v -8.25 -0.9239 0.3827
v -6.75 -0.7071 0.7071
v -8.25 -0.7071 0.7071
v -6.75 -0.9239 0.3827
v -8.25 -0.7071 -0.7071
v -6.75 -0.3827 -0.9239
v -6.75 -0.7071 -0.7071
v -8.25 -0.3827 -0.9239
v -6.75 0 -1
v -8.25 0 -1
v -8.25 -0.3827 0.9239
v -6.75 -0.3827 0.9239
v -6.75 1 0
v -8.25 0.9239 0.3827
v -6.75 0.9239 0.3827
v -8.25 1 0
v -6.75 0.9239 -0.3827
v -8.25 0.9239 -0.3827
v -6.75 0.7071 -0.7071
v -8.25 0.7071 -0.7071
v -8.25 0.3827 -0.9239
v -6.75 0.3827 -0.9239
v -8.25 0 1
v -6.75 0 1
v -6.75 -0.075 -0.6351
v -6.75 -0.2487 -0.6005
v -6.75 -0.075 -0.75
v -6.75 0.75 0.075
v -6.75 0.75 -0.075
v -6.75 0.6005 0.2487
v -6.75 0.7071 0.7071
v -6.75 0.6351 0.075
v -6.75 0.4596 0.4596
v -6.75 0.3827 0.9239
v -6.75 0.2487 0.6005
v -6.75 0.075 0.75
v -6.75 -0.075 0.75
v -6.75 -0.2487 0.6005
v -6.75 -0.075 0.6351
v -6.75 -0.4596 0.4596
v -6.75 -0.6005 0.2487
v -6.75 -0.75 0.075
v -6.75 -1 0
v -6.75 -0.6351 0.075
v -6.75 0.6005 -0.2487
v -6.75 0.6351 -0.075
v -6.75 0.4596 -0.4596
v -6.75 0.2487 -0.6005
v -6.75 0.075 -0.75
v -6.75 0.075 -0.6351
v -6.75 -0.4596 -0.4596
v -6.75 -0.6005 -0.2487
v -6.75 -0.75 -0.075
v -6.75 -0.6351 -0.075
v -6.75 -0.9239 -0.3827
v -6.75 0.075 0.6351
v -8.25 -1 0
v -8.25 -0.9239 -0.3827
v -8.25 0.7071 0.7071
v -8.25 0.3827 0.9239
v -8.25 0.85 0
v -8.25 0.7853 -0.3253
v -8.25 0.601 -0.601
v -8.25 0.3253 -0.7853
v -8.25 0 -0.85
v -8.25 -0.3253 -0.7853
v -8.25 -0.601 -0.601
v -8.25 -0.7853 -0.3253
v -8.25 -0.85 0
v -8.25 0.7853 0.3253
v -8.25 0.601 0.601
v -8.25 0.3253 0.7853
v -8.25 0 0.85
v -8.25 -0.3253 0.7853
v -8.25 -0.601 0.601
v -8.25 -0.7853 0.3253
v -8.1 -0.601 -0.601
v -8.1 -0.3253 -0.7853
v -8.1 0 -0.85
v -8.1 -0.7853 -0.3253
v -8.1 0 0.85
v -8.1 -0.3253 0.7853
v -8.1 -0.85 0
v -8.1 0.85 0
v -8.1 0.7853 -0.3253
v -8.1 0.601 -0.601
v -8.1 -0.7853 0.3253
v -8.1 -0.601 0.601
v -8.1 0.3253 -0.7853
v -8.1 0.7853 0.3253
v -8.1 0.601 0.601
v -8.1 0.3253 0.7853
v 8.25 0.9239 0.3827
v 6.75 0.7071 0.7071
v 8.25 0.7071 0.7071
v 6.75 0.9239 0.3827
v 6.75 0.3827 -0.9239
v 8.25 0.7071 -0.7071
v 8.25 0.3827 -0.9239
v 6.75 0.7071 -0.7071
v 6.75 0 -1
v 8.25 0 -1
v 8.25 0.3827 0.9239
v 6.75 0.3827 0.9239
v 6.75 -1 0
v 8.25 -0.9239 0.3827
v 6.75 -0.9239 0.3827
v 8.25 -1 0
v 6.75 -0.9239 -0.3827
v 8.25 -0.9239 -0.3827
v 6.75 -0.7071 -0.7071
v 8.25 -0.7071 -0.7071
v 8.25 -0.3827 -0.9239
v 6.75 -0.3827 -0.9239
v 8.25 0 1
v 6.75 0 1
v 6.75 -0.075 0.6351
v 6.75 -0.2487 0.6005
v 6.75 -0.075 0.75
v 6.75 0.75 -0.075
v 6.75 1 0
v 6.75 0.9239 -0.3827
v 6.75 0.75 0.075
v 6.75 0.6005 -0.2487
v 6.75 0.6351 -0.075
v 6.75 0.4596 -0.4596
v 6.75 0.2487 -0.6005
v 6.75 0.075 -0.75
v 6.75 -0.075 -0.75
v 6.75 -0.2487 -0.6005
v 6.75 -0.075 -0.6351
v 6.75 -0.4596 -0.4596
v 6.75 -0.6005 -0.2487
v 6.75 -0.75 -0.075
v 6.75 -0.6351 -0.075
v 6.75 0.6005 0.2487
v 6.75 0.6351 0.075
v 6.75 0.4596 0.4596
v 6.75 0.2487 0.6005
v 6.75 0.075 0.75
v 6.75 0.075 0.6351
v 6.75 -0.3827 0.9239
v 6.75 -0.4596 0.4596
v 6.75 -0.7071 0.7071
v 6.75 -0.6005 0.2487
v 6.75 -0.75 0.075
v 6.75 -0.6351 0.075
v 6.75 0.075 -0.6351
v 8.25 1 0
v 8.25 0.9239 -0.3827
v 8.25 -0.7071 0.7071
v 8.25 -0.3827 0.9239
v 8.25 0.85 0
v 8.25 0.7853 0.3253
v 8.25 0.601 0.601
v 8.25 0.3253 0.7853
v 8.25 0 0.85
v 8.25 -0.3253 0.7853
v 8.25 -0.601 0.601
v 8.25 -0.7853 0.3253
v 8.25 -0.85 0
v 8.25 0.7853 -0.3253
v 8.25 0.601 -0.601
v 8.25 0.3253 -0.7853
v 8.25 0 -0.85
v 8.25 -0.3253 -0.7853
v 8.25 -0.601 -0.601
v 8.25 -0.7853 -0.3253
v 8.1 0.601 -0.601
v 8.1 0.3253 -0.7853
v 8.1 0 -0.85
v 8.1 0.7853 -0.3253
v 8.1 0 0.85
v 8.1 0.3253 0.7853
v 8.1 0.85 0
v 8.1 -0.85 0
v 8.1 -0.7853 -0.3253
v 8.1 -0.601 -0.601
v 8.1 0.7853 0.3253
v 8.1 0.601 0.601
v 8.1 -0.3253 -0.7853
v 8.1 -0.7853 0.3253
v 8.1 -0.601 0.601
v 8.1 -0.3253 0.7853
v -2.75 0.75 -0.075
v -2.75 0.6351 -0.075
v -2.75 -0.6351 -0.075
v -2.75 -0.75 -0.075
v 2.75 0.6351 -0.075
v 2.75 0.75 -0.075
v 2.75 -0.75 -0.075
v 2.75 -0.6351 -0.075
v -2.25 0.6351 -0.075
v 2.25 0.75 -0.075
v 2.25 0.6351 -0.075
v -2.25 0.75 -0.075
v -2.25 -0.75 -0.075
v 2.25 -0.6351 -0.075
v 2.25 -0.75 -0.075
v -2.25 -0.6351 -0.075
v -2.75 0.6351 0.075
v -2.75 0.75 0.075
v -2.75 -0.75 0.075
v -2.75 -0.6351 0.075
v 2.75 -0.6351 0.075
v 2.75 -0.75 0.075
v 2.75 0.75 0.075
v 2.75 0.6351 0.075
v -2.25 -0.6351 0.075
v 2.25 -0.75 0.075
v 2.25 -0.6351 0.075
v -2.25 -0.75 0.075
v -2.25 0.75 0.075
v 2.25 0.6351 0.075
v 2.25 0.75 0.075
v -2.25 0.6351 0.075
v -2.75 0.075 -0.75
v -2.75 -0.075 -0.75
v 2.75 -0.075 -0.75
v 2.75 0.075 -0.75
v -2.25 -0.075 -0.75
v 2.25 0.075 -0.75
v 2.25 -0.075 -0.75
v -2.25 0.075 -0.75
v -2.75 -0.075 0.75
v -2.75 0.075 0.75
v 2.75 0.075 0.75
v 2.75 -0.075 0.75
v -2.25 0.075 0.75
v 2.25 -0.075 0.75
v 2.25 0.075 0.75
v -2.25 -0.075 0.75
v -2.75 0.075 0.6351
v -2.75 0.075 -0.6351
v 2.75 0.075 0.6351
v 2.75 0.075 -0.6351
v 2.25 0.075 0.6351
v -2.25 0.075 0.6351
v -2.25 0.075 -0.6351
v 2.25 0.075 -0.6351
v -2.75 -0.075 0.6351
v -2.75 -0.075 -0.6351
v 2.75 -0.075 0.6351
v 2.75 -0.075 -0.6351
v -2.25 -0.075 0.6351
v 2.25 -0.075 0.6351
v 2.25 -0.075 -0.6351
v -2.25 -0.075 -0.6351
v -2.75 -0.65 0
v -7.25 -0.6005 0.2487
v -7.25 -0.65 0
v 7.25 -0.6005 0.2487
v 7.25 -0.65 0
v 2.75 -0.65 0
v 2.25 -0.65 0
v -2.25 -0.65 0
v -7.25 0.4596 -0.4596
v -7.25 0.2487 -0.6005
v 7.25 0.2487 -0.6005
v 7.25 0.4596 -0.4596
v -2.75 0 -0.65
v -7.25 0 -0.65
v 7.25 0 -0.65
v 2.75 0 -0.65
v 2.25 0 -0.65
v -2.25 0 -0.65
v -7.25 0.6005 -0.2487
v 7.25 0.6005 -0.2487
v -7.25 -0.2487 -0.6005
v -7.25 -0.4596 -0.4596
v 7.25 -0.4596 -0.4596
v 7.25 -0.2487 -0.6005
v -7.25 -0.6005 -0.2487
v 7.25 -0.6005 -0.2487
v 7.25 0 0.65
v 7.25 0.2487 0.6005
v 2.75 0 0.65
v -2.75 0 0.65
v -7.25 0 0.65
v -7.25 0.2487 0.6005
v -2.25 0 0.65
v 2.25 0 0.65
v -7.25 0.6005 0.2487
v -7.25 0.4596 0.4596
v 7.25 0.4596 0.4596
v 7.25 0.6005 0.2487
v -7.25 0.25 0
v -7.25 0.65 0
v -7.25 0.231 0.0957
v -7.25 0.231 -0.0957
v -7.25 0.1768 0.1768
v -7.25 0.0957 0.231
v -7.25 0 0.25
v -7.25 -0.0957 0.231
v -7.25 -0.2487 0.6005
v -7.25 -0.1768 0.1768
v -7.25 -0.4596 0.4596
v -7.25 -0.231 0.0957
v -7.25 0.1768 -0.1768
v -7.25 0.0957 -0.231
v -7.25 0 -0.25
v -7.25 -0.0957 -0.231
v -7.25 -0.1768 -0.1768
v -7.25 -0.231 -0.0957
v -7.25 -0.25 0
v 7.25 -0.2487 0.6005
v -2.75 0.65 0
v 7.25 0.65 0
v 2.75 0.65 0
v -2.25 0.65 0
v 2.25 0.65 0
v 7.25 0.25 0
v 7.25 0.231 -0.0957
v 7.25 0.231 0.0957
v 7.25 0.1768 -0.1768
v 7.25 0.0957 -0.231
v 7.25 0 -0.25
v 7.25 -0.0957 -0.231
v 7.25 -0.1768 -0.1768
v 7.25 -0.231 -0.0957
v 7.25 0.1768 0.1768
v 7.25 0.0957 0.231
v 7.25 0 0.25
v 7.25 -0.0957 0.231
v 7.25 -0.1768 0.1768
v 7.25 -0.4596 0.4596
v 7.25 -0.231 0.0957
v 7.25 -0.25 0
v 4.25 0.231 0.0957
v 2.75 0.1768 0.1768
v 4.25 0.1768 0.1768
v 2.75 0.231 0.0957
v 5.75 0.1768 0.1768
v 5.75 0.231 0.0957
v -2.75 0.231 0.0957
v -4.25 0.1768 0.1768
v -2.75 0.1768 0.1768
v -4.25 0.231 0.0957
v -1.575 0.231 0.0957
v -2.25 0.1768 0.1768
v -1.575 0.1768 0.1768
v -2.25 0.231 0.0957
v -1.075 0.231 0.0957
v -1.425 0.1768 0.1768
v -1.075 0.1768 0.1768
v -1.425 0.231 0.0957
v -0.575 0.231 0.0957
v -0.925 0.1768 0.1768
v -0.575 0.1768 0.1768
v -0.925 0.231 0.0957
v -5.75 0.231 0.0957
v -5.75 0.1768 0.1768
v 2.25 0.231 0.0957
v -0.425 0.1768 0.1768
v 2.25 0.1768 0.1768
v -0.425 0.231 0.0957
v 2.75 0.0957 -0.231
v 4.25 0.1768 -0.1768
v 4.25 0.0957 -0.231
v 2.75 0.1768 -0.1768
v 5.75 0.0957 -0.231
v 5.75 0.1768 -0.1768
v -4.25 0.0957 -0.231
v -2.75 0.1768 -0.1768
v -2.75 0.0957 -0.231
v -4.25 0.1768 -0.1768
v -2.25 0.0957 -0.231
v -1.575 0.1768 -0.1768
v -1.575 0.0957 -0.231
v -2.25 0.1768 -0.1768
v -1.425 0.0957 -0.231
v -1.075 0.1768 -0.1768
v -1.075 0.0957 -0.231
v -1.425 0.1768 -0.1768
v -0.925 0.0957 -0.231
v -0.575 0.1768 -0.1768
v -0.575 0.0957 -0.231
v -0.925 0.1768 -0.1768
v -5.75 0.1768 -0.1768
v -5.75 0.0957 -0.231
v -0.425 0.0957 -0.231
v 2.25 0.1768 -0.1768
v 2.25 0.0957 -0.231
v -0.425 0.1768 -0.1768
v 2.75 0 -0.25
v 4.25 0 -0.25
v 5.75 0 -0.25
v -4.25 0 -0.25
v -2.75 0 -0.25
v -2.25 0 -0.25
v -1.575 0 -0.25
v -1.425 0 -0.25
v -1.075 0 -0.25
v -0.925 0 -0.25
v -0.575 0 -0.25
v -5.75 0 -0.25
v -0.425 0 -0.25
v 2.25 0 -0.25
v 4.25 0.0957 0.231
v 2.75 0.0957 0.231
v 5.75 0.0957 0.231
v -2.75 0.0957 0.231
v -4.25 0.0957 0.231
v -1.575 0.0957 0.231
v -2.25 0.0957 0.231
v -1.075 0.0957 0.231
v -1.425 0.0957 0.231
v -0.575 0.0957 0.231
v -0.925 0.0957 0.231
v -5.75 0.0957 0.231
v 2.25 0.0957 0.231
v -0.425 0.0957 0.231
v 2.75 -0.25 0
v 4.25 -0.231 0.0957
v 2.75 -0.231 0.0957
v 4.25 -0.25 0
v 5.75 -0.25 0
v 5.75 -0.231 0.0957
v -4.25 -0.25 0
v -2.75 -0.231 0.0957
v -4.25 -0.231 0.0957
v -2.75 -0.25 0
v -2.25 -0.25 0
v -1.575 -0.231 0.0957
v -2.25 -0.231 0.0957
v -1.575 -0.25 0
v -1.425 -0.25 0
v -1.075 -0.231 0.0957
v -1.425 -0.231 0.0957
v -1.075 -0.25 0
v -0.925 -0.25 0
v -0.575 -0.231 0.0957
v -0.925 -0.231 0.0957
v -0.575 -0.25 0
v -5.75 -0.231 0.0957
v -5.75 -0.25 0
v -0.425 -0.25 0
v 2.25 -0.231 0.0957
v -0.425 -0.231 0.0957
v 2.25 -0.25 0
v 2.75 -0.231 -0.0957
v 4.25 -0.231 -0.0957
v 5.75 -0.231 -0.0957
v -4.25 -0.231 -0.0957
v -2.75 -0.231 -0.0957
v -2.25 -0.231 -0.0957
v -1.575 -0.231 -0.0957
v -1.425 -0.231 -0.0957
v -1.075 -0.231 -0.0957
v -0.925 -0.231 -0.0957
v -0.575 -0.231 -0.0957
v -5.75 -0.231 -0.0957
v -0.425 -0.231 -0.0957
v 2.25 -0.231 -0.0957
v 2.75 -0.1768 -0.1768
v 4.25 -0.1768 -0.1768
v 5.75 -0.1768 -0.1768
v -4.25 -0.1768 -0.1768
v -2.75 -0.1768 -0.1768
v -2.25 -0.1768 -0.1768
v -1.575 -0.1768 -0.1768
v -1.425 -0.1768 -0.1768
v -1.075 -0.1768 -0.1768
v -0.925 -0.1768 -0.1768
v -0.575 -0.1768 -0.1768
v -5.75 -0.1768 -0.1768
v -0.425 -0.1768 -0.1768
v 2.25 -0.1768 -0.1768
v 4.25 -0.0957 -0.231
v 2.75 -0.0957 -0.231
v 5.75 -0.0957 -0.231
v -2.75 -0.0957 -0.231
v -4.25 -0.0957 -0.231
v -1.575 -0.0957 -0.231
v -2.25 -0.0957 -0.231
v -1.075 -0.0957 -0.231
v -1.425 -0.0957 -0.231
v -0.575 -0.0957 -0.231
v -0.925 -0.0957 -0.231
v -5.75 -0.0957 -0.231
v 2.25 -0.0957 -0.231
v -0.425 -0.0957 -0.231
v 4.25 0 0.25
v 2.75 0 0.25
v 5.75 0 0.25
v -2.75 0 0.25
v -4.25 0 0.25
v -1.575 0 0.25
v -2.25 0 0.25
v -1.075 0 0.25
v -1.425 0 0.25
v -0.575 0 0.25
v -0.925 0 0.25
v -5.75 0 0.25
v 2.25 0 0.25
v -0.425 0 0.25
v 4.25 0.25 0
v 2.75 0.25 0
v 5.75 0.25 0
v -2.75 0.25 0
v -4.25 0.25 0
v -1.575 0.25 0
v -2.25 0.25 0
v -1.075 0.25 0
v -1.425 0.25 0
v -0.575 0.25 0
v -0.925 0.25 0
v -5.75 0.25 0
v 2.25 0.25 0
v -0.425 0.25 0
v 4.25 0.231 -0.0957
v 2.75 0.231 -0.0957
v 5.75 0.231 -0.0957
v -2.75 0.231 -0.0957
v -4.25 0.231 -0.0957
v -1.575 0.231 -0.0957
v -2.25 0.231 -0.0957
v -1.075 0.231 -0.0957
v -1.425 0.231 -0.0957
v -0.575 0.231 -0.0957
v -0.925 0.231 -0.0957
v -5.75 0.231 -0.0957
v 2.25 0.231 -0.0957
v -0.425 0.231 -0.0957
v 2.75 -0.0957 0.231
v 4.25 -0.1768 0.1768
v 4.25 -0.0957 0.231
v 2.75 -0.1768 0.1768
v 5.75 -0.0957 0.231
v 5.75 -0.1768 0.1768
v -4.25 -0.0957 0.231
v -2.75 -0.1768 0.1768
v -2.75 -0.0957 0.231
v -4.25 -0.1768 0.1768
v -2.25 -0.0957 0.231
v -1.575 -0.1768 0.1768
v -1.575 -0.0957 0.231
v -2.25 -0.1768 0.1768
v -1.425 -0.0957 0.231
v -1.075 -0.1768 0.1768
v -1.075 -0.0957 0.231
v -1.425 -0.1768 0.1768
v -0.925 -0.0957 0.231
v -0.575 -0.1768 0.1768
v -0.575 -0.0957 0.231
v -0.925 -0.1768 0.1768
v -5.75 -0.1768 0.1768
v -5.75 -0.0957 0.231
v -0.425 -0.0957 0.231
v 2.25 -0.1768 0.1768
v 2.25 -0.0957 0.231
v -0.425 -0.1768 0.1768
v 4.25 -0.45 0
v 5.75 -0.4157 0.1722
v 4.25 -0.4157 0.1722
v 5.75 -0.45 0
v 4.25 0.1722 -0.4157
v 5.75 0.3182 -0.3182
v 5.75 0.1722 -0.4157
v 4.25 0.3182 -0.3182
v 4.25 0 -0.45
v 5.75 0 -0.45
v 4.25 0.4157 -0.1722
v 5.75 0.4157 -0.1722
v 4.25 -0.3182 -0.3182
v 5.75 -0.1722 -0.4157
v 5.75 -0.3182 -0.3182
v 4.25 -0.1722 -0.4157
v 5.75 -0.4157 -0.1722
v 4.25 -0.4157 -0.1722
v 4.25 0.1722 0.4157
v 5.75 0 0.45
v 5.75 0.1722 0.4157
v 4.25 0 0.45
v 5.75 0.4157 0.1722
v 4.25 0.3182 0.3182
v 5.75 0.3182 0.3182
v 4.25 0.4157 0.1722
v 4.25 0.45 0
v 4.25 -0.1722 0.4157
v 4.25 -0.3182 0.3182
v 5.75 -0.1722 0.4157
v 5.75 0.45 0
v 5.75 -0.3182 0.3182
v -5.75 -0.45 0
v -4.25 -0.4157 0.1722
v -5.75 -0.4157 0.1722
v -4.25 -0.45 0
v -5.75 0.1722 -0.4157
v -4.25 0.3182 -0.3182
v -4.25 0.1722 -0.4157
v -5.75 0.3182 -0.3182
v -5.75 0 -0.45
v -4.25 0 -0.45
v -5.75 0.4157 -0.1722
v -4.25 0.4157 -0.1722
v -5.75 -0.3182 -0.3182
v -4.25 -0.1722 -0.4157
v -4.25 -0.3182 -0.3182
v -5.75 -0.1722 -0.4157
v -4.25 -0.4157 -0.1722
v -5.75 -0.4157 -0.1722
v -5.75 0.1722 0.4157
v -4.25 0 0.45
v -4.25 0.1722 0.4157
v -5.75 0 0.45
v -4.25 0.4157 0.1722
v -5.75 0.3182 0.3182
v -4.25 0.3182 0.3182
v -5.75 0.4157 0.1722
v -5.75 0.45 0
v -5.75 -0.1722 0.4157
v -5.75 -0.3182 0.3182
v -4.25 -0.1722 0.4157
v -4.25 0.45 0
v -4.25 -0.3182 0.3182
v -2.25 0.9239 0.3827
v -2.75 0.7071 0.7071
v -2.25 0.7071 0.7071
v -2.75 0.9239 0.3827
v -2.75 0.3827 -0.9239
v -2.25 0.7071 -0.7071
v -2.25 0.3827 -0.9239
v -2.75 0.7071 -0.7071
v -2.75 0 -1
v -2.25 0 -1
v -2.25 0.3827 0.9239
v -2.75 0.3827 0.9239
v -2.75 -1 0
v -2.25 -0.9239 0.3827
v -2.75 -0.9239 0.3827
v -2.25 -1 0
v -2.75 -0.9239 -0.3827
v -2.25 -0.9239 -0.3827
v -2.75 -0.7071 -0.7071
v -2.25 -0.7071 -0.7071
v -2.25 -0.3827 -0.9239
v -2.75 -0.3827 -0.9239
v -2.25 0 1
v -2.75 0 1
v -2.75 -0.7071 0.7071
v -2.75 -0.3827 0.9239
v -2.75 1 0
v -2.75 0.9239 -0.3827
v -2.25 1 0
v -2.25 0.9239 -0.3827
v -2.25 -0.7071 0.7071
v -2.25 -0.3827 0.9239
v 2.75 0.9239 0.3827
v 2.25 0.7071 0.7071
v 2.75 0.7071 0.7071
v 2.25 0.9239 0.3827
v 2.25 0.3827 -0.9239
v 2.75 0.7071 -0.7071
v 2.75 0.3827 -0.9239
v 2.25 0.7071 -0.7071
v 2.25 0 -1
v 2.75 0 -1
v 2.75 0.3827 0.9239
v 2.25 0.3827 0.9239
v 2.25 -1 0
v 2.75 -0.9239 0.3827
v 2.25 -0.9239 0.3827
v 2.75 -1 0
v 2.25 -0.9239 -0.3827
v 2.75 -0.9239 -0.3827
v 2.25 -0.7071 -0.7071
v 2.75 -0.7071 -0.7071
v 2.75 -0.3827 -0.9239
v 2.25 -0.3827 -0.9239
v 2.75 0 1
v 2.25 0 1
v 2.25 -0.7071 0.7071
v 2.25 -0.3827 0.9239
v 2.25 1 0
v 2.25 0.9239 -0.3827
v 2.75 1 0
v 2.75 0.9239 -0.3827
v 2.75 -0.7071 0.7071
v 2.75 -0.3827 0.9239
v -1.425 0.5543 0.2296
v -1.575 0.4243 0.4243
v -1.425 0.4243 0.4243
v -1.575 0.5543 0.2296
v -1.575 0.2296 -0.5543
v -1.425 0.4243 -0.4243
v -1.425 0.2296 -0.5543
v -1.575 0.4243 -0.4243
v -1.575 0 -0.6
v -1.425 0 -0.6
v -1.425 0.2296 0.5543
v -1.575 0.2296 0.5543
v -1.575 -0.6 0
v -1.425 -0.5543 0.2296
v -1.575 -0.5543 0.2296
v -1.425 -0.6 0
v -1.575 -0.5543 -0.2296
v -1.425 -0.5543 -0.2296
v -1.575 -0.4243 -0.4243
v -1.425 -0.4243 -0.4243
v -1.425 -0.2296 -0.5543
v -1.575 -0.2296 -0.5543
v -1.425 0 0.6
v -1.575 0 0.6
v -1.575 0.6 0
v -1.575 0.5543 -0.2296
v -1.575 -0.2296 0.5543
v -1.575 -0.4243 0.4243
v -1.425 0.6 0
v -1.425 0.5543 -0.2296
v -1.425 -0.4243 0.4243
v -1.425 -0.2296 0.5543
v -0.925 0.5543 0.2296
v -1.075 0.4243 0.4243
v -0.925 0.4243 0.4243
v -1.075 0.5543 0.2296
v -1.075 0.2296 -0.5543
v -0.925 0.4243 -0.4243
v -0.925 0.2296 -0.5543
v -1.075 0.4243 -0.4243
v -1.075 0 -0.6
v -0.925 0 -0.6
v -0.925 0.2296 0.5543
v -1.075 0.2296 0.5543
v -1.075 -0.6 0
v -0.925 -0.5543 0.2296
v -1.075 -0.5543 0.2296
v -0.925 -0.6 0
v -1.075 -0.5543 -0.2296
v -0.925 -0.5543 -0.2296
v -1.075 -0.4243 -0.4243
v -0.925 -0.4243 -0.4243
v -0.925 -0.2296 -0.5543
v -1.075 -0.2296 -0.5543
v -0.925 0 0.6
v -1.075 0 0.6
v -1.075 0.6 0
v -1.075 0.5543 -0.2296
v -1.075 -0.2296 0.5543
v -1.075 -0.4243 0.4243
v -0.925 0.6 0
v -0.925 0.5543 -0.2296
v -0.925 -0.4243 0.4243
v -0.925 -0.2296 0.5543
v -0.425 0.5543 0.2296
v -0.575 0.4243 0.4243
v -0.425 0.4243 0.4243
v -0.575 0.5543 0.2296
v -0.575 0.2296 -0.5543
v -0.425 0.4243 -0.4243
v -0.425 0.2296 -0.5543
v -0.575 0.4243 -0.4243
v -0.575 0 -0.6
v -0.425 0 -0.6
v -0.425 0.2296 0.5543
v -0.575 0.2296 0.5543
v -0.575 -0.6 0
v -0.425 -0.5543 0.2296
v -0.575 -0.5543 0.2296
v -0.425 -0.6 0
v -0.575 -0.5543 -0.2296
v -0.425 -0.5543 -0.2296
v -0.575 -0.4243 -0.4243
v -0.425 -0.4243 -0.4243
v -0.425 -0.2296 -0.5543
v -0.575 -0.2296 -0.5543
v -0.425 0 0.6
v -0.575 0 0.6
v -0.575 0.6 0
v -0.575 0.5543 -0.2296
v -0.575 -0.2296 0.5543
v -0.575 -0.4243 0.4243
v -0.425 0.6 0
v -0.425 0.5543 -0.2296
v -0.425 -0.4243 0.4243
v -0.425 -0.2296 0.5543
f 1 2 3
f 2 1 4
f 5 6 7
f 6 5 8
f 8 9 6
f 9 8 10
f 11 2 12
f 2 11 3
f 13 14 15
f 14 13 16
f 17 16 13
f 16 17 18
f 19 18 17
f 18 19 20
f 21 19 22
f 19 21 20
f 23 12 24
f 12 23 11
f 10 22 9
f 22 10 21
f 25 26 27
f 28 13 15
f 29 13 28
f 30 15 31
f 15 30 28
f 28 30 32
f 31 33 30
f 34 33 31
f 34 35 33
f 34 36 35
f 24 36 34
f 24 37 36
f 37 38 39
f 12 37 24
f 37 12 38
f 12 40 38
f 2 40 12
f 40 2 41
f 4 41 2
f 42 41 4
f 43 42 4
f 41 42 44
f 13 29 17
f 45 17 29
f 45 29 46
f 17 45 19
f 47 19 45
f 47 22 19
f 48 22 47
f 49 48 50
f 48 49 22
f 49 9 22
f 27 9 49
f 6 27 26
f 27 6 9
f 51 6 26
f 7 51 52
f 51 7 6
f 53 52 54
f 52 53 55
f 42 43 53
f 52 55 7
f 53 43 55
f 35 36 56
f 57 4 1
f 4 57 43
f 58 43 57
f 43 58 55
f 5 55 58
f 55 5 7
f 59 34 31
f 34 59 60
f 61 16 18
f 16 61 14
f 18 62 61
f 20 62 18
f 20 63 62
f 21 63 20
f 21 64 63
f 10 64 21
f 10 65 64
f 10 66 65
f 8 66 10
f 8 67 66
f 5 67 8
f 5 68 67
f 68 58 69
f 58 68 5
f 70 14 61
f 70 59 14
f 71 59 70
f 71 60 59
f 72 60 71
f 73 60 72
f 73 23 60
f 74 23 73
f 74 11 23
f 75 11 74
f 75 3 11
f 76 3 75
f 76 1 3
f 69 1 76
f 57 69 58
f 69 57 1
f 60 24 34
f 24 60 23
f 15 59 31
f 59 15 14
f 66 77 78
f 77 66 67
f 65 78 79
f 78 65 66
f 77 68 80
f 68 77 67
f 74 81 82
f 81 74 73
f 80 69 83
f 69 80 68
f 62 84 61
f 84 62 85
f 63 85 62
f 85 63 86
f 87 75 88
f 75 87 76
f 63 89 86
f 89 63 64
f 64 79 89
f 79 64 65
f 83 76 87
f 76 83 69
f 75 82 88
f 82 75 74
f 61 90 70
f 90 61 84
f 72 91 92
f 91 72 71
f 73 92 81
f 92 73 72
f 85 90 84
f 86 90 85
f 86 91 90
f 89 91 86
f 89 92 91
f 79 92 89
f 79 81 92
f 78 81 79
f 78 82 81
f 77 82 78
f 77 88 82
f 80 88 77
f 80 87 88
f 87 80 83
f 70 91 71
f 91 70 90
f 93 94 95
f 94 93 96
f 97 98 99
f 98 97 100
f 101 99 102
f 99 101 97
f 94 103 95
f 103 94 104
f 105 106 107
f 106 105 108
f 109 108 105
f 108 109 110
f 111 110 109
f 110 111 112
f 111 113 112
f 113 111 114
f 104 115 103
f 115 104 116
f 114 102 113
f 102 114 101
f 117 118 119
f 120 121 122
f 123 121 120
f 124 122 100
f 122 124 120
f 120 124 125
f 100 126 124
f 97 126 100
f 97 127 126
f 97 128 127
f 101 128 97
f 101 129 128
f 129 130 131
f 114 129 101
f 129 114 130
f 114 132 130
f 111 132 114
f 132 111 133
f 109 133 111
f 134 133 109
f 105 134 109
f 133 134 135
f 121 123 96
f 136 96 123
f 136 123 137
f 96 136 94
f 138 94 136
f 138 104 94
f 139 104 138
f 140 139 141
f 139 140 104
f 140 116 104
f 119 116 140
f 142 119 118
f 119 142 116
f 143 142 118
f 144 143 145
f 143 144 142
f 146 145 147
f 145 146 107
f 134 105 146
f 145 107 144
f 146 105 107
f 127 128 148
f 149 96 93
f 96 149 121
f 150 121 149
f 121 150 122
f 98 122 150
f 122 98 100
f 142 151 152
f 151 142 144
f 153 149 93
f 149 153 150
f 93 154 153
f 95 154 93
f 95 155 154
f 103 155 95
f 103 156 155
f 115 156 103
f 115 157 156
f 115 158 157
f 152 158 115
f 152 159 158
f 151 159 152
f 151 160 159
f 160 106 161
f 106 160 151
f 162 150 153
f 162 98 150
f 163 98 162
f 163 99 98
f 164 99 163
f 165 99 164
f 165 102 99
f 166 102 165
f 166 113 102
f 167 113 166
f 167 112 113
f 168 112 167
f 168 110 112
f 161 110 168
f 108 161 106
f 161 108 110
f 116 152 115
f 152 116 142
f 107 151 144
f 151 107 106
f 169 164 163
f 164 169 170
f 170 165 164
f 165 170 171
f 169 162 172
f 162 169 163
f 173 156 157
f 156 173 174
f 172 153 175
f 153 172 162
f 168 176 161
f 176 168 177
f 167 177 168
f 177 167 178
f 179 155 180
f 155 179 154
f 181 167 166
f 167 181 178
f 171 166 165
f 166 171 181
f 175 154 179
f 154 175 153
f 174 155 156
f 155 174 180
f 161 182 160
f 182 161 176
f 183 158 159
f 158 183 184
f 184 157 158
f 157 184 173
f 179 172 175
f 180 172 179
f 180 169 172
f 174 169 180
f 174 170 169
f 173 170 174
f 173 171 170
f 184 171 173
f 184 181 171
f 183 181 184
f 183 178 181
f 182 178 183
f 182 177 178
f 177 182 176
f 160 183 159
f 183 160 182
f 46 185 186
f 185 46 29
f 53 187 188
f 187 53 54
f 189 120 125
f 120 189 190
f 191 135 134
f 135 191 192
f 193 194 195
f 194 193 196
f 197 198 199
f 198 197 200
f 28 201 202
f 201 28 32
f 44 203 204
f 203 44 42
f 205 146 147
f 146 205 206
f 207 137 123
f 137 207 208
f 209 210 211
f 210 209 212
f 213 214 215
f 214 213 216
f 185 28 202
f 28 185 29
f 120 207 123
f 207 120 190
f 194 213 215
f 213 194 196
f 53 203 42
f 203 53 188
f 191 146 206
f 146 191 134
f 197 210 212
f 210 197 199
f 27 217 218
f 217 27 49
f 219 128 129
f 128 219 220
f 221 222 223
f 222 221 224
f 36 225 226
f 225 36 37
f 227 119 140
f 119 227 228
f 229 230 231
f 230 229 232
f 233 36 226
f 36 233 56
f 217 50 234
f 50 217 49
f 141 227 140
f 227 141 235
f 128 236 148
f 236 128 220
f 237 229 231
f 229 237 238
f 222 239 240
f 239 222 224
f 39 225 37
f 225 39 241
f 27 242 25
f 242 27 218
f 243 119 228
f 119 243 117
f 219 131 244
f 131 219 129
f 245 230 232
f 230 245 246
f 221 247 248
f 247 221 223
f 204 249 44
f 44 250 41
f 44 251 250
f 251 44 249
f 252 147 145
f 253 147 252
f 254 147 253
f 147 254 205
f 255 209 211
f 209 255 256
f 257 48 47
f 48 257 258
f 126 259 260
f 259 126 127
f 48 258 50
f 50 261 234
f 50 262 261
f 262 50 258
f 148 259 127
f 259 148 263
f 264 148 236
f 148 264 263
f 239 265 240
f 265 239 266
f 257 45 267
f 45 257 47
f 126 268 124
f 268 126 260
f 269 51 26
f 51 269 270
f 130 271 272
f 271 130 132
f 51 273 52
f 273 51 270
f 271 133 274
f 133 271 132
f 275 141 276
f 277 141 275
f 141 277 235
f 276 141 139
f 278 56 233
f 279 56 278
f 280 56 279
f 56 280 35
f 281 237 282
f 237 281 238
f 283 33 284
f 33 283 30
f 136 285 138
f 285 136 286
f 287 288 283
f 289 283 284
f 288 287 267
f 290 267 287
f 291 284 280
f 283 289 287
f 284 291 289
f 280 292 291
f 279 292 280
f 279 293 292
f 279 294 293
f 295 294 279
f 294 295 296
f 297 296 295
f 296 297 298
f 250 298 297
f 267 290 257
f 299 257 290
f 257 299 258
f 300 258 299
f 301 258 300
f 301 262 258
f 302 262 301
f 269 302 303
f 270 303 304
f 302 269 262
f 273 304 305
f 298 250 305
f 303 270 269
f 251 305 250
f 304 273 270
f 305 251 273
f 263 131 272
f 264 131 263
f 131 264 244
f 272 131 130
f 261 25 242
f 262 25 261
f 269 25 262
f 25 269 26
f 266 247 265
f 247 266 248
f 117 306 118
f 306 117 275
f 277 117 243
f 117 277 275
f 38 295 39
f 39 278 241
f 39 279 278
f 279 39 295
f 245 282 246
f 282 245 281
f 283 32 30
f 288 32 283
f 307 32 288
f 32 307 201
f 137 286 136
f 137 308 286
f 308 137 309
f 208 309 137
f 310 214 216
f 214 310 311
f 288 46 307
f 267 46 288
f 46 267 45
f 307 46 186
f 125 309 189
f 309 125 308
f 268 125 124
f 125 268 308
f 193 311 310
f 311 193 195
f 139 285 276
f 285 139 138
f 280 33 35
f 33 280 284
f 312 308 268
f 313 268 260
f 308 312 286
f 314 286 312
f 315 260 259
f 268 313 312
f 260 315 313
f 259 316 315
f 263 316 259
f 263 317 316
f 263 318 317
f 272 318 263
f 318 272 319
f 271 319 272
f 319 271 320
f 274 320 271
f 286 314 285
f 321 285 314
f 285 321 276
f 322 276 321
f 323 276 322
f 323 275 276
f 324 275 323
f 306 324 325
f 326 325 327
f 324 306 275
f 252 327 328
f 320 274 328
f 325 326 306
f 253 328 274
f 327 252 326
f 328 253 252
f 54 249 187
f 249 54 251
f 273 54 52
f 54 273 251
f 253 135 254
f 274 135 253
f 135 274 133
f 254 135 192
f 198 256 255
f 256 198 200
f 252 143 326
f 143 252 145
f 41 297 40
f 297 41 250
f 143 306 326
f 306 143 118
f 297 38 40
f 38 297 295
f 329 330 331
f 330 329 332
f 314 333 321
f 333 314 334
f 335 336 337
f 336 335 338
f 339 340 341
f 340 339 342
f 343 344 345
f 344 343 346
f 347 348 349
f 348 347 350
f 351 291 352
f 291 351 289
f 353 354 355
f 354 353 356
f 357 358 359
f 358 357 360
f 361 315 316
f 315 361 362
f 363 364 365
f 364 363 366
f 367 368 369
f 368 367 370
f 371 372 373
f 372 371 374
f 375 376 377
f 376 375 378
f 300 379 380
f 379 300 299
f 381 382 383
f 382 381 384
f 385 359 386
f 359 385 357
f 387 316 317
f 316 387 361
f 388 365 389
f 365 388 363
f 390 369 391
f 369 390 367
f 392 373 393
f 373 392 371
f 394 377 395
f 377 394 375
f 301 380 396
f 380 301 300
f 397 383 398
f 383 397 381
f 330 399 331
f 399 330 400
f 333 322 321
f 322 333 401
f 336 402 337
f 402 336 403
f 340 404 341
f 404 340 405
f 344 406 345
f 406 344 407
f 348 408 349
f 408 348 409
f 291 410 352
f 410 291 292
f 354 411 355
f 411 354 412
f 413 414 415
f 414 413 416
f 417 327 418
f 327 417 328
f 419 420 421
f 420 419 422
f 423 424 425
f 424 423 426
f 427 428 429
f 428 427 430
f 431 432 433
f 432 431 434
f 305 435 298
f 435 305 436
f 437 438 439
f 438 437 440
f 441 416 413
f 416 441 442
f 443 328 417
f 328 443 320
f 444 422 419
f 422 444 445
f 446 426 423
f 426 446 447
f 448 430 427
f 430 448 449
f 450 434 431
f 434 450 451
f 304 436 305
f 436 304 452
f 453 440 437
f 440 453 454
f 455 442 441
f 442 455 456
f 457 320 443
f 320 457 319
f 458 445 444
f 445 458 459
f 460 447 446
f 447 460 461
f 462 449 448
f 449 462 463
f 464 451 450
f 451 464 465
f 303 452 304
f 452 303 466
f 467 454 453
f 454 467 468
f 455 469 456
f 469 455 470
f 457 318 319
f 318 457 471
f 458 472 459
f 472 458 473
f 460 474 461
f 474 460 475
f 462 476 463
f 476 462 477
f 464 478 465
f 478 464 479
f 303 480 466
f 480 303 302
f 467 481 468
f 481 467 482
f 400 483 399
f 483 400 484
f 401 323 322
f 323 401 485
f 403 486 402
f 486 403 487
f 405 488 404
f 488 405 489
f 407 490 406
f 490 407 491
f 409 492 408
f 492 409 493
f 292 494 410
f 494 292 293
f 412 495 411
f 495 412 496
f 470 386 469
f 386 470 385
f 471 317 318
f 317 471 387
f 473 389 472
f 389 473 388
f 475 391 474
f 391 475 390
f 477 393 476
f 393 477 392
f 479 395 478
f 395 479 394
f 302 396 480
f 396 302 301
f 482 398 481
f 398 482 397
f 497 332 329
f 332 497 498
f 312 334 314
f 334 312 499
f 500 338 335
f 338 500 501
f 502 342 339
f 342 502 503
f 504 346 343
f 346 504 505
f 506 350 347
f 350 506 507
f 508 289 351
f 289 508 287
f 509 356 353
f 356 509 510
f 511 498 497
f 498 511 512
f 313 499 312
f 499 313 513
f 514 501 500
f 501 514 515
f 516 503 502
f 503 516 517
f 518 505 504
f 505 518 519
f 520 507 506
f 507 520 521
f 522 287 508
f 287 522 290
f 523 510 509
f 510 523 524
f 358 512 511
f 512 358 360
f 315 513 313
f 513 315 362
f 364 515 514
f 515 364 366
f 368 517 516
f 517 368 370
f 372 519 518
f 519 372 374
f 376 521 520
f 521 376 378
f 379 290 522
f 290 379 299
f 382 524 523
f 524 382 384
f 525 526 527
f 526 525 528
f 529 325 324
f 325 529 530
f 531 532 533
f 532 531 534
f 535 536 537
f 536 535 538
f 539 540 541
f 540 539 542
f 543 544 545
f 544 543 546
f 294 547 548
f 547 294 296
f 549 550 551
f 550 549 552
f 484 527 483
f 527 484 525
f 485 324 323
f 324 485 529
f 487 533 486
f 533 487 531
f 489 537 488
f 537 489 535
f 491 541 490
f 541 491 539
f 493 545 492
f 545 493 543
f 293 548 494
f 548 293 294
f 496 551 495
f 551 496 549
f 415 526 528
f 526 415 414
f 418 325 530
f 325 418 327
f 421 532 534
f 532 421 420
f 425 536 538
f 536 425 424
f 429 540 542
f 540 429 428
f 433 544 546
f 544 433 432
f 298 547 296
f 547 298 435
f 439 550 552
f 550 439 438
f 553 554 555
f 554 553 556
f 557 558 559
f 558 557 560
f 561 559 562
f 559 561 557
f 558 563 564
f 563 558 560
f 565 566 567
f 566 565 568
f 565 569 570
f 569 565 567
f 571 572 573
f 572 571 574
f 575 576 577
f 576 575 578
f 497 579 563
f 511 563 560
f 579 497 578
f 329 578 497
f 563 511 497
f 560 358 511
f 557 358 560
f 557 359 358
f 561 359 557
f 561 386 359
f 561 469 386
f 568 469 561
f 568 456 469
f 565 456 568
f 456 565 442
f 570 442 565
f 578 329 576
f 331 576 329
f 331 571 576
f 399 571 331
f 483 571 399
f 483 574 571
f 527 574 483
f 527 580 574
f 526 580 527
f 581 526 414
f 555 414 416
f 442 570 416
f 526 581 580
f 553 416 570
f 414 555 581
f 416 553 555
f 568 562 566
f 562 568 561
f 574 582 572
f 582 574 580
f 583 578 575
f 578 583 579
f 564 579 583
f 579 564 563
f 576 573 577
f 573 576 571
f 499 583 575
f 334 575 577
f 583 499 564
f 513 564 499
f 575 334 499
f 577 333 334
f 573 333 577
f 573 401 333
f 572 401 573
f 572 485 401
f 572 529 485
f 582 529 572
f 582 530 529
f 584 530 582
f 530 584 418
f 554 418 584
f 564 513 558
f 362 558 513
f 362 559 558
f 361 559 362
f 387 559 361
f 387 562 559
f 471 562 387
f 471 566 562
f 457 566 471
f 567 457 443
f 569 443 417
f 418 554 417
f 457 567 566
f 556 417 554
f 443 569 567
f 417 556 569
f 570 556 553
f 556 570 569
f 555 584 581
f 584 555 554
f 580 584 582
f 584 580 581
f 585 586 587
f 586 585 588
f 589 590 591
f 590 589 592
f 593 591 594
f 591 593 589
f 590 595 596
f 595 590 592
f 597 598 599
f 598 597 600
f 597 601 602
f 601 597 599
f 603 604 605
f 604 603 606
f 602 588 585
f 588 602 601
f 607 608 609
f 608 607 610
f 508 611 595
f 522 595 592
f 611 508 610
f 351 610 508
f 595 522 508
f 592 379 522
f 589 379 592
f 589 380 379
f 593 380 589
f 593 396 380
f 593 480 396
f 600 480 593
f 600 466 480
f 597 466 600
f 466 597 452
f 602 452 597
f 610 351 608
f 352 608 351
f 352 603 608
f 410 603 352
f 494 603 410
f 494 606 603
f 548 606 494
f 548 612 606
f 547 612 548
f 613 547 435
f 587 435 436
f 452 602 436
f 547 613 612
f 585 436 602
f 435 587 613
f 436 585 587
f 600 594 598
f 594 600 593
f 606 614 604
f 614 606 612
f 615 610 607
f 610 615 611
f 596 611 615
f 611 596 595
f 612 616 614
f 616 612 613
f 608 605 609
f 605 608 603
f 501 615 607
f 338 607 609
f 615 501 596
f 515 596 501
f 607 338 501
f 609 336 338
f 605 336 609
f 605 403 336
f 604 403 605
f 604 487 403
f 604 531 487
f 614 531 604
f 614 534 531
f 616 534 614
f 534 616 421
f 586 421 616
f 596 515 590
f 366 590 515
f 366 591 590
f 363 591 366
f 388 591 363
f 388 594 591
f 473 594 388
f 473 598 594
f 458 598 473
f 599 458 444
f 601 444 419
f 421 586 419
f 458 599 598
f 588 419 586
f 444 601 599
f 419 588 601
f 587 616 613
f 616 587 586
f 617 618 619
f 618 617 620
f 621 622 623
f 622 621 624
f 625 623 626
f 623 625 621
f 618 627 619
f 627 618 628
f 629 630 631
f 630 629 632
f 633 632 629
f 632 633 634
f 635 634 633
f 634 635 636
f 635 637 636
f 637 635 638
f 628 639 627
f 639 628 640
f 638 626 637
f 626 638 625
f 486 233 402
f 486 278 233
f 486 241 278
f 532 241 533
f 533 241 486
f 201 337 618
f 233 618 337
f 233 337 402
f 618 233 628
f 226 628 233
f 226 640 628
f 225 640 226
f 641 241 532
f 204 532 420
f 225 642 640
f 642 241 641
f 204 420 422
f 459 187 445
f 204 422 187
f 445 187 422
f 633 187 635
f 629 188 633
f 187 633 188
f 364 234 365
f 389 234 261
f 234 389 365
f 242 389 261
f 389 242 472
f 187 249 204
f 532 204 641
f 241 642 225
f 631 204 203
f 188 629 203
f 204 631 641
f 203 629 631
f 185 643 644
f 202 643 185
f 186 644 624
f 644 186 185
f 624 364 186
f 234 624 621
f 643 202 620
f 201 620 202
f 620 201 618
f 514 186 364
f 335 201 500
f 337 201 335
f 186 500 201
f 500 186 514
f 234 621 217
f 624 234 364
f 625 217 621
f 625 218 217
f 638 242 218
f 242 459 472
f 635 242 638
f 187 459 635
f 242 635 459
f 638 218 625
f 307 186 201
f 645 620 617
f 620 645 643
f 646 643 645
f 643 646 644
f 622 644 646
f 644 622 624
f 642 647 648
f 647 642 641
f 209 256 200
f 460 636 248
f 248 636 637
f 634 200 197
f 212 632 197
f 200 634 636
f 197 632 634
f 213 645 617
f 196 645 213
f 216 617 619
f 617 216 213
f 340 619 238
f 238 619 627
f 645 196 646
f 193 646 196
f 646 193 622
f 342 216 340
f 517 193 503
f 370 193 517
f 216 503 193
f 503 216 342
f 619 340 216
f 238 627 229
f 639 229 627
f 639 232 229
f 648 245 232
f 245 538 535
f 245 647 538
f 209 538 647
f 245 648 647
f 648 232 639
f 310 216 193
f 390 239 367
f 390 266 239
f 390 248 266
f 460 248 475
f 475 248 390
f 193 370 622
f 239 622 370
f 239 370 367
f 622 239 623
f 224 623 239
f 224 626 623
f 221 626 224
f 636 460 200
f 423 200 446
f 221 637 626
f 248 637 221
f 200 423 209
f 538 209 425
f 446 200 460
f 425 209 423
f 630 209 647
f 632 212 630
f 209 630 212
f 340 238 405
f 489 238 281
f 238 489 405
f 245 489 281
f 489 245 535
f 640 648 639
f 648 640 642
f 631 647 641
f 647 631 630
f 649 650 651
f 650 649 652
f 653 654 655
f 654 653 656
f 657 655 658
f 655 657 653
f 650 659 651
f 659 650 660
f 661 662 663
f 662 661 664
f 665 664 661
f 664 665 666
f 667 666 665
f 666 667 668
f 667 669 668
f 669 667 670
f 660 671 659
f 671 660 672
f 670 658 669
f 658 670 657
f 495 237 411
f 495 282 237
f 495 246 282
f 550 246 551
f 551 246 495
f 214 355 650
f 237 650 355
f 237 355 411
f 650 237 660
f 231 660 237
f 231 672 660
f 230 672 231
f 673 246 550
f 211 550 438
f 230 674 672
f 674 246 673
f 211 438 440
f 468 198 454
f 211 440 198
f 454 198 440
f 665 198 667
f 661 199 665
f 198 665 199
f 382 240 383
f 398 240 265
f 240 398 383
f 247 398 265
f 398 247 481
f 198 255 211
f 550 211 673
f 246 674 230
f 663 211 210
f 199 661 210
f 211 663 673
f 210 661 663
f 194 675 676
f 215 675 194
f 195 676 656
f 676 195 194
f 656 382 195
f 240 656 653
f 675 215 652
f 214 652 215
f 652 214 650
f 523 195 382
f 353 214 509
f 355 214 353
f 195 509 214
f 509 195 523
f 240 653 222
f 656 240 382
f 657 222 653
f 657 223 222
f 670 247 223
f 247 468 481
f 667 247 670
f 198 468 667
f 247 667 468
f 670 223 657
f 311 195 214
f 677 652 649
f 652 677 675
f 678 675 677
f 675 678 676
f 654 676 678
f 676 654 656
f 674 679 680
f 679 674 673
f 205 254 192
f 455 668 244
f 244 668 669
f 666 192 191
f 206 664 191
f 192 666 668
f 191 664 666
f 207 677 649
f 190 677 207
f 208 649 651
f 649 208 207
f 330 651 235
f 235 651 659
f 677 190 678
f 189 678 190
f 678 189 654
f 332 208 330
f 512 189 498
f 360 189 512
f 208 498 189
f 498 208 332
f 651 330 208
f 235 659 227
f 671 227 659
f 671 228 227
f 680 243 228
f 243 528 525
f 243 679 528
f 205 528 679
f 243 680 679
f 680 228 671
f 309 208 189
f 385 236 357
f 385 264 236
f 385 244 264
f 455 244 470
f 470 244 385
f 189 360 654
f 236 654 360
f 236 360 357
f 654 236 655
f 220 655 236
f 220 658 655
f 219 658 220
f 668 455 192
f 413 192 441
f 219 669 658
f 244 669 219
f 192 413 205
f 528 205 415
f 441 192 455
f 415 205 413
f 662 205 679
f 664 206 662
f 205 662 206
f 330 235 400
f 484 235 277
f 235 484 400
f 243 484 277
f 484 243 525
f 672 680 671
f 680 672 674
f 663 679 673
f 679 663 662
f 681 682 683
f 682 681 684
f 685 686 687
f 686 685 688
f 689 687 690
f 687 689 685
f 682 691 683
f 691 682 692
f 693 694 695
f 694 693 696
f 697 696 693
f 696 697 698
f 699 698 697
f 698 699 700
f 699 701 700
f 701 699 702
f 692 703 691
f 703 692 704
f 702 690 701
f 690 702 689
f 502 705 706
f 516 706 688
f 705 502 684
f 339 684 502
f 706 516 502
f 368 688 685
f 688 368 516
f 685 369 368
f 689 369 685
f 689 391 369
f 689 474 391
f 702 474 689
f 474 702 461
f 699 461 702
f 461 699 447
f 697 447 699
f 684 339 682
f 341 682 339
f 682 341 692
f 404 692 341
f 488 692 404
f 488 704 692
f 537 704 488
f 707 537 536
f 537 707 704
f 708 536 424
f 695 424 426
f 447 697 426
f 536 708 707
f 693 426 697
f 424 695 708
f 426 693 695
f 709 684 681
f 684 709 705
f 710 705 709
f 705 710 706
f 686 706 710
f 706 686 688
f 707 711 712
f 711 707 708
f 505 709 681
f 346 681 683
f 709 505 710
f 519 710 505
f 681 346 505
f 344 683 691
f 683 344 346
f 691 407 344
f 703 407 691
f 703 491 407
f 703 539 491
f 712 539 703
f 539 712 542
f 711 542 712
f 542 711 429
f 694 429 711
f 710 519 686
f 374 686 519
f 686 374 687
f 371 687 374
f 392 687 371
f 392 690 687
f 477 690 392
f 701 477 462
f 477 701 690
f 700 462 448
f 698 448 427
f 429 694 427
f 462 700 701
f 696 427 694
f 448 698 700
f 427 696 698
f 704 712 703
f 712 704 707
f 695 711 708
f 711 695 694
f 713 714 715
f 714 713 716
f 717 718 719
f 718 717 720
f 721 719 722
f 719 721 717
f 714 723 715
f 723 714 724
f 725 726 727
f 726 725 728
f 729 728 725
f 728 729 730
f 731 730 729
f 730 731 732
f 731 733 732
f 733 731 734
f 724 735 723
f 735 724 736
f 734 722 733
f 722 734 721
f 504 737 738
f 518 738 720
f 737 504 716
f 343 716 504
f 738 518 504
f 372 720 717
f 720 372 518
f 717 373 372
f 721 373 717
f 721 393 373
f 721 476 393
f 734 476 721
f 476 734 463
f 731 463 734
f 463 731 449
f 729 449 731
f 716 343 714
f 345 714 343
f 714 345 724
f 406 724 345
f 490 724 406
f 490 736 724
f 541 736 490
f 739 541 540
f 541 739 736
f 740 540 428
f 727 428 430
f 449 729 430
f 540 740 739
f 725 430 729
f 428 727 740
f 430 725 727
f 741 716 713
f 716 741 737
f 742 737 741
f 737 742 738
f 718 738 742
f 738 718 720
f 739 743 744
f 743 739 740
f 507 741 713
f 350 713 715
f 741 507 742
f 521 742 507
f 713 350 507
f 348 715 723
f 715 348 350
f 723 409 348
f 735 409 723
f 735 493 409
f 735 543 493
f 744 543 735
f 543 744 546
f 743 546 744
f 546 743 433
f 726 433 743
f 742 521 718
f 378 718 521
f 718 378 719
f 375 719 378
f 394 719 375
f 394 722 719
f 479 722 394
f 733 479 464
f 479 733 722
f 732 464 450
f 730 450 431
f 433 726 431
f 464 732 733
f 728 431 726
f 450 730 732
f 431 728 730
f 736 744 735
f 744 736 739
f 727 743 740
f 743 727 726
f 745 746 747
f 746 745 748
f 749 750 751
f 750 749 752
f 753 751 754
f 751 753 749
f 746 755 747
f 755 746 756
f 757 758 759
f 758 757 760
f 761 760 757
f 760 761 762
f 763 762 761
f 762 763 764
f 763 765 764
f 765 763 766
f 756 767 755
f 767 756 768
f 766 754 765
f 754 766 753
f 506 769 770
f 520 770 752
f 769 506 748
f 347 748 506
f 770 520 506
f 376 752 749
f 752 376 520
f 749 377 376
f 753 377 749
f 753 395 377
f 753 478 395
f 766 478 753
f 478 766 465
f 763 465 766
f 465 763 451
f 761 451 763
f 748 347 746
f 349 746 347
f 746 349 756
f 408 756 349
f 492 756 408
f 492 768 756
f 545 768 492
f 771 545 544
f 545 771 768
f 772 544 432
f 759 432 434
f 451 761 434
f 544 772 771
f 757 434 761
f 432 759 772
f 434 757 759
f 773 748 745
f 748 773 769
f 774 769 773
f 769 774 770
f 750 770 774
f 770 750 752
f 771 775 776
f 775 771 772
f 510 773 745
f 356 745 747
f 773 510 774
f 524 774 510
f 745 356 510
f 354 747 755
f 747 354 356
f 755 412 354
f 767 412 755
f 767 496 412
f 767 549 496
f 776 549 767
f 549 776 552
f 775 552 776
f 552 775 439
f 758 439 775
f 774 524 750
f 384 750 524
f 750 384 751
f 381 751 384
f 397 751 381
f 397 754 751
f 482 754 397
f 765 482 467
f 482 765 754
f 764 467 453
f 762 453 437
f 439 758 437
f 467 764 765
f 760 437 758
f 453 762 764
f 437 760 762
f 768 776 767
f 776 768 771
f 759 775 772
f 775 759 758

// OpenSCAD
$fn=16;

module endpiece(r, h)
{
	difference() {
		cylinder(h = h, r1 = r, r2 = r, center = true);
		translate(v = [0, 0, 1.8 * h / 2])
			cylinder(h = h, r1 = r * 0.85, r2 = r * 0.85, center = true);
	}
}


module warp_core()
{
	rotate(a = 90, v = [0, 1, 0]) {
		union() {
			difference() {
				union() {
					translate(v = [0, 0, -15])
						rotate(v = [1, 0, 0], 180)
							endpiece(2, 3);
					translate(v = [0, 0, 15])
						endpiece(2, 3);
					cube(size = [0.3, 3.0, 30], center = true);
					cube(size = [3.0, 0.3, 30], center = true);
				}
				cylinder(h = 29, r1 = 1.3, r2 = 1.3, center = true);
			}
			cylinder(h = 29.5, r1 = 0.5, r2 = 0.5, center = true);
			translate(v = [0, 0, 10])
				cylinder(h = 3, r1 = 0.9, r2 = 0.9, center = true);
			translate(v = [0, 0, -10])
				cylinder(h = 3, r1 = 0.9, r2 = 0.9, center = true);
			translate(v = [0, 0, -5])
				cylinder(h = 1, r1 = 2, r2 = 2, center = true);
			translate(v = [0, 0, 5])
				cylinder(h = 1, r1 = 2, r2 = 2, center = true);

			translate(v = [0, 0, -3])
				cylinder(h = 0.3, r1 = 1.2, r2 = 1.2, center = true);
			translate(v = [0, 0, -2])
				cylinder(h = 0.3, r1 = 1.2, r2 = 1.2, center = true);
			translate(v = [0, 0, -1])
				cylinder(h = 0.3, r1 = 1.2, r2 = 1.2, center = true);
		}
	}
}

scale(v = [0.5, 0.5, 0.5]) {
	warp_core();
}
